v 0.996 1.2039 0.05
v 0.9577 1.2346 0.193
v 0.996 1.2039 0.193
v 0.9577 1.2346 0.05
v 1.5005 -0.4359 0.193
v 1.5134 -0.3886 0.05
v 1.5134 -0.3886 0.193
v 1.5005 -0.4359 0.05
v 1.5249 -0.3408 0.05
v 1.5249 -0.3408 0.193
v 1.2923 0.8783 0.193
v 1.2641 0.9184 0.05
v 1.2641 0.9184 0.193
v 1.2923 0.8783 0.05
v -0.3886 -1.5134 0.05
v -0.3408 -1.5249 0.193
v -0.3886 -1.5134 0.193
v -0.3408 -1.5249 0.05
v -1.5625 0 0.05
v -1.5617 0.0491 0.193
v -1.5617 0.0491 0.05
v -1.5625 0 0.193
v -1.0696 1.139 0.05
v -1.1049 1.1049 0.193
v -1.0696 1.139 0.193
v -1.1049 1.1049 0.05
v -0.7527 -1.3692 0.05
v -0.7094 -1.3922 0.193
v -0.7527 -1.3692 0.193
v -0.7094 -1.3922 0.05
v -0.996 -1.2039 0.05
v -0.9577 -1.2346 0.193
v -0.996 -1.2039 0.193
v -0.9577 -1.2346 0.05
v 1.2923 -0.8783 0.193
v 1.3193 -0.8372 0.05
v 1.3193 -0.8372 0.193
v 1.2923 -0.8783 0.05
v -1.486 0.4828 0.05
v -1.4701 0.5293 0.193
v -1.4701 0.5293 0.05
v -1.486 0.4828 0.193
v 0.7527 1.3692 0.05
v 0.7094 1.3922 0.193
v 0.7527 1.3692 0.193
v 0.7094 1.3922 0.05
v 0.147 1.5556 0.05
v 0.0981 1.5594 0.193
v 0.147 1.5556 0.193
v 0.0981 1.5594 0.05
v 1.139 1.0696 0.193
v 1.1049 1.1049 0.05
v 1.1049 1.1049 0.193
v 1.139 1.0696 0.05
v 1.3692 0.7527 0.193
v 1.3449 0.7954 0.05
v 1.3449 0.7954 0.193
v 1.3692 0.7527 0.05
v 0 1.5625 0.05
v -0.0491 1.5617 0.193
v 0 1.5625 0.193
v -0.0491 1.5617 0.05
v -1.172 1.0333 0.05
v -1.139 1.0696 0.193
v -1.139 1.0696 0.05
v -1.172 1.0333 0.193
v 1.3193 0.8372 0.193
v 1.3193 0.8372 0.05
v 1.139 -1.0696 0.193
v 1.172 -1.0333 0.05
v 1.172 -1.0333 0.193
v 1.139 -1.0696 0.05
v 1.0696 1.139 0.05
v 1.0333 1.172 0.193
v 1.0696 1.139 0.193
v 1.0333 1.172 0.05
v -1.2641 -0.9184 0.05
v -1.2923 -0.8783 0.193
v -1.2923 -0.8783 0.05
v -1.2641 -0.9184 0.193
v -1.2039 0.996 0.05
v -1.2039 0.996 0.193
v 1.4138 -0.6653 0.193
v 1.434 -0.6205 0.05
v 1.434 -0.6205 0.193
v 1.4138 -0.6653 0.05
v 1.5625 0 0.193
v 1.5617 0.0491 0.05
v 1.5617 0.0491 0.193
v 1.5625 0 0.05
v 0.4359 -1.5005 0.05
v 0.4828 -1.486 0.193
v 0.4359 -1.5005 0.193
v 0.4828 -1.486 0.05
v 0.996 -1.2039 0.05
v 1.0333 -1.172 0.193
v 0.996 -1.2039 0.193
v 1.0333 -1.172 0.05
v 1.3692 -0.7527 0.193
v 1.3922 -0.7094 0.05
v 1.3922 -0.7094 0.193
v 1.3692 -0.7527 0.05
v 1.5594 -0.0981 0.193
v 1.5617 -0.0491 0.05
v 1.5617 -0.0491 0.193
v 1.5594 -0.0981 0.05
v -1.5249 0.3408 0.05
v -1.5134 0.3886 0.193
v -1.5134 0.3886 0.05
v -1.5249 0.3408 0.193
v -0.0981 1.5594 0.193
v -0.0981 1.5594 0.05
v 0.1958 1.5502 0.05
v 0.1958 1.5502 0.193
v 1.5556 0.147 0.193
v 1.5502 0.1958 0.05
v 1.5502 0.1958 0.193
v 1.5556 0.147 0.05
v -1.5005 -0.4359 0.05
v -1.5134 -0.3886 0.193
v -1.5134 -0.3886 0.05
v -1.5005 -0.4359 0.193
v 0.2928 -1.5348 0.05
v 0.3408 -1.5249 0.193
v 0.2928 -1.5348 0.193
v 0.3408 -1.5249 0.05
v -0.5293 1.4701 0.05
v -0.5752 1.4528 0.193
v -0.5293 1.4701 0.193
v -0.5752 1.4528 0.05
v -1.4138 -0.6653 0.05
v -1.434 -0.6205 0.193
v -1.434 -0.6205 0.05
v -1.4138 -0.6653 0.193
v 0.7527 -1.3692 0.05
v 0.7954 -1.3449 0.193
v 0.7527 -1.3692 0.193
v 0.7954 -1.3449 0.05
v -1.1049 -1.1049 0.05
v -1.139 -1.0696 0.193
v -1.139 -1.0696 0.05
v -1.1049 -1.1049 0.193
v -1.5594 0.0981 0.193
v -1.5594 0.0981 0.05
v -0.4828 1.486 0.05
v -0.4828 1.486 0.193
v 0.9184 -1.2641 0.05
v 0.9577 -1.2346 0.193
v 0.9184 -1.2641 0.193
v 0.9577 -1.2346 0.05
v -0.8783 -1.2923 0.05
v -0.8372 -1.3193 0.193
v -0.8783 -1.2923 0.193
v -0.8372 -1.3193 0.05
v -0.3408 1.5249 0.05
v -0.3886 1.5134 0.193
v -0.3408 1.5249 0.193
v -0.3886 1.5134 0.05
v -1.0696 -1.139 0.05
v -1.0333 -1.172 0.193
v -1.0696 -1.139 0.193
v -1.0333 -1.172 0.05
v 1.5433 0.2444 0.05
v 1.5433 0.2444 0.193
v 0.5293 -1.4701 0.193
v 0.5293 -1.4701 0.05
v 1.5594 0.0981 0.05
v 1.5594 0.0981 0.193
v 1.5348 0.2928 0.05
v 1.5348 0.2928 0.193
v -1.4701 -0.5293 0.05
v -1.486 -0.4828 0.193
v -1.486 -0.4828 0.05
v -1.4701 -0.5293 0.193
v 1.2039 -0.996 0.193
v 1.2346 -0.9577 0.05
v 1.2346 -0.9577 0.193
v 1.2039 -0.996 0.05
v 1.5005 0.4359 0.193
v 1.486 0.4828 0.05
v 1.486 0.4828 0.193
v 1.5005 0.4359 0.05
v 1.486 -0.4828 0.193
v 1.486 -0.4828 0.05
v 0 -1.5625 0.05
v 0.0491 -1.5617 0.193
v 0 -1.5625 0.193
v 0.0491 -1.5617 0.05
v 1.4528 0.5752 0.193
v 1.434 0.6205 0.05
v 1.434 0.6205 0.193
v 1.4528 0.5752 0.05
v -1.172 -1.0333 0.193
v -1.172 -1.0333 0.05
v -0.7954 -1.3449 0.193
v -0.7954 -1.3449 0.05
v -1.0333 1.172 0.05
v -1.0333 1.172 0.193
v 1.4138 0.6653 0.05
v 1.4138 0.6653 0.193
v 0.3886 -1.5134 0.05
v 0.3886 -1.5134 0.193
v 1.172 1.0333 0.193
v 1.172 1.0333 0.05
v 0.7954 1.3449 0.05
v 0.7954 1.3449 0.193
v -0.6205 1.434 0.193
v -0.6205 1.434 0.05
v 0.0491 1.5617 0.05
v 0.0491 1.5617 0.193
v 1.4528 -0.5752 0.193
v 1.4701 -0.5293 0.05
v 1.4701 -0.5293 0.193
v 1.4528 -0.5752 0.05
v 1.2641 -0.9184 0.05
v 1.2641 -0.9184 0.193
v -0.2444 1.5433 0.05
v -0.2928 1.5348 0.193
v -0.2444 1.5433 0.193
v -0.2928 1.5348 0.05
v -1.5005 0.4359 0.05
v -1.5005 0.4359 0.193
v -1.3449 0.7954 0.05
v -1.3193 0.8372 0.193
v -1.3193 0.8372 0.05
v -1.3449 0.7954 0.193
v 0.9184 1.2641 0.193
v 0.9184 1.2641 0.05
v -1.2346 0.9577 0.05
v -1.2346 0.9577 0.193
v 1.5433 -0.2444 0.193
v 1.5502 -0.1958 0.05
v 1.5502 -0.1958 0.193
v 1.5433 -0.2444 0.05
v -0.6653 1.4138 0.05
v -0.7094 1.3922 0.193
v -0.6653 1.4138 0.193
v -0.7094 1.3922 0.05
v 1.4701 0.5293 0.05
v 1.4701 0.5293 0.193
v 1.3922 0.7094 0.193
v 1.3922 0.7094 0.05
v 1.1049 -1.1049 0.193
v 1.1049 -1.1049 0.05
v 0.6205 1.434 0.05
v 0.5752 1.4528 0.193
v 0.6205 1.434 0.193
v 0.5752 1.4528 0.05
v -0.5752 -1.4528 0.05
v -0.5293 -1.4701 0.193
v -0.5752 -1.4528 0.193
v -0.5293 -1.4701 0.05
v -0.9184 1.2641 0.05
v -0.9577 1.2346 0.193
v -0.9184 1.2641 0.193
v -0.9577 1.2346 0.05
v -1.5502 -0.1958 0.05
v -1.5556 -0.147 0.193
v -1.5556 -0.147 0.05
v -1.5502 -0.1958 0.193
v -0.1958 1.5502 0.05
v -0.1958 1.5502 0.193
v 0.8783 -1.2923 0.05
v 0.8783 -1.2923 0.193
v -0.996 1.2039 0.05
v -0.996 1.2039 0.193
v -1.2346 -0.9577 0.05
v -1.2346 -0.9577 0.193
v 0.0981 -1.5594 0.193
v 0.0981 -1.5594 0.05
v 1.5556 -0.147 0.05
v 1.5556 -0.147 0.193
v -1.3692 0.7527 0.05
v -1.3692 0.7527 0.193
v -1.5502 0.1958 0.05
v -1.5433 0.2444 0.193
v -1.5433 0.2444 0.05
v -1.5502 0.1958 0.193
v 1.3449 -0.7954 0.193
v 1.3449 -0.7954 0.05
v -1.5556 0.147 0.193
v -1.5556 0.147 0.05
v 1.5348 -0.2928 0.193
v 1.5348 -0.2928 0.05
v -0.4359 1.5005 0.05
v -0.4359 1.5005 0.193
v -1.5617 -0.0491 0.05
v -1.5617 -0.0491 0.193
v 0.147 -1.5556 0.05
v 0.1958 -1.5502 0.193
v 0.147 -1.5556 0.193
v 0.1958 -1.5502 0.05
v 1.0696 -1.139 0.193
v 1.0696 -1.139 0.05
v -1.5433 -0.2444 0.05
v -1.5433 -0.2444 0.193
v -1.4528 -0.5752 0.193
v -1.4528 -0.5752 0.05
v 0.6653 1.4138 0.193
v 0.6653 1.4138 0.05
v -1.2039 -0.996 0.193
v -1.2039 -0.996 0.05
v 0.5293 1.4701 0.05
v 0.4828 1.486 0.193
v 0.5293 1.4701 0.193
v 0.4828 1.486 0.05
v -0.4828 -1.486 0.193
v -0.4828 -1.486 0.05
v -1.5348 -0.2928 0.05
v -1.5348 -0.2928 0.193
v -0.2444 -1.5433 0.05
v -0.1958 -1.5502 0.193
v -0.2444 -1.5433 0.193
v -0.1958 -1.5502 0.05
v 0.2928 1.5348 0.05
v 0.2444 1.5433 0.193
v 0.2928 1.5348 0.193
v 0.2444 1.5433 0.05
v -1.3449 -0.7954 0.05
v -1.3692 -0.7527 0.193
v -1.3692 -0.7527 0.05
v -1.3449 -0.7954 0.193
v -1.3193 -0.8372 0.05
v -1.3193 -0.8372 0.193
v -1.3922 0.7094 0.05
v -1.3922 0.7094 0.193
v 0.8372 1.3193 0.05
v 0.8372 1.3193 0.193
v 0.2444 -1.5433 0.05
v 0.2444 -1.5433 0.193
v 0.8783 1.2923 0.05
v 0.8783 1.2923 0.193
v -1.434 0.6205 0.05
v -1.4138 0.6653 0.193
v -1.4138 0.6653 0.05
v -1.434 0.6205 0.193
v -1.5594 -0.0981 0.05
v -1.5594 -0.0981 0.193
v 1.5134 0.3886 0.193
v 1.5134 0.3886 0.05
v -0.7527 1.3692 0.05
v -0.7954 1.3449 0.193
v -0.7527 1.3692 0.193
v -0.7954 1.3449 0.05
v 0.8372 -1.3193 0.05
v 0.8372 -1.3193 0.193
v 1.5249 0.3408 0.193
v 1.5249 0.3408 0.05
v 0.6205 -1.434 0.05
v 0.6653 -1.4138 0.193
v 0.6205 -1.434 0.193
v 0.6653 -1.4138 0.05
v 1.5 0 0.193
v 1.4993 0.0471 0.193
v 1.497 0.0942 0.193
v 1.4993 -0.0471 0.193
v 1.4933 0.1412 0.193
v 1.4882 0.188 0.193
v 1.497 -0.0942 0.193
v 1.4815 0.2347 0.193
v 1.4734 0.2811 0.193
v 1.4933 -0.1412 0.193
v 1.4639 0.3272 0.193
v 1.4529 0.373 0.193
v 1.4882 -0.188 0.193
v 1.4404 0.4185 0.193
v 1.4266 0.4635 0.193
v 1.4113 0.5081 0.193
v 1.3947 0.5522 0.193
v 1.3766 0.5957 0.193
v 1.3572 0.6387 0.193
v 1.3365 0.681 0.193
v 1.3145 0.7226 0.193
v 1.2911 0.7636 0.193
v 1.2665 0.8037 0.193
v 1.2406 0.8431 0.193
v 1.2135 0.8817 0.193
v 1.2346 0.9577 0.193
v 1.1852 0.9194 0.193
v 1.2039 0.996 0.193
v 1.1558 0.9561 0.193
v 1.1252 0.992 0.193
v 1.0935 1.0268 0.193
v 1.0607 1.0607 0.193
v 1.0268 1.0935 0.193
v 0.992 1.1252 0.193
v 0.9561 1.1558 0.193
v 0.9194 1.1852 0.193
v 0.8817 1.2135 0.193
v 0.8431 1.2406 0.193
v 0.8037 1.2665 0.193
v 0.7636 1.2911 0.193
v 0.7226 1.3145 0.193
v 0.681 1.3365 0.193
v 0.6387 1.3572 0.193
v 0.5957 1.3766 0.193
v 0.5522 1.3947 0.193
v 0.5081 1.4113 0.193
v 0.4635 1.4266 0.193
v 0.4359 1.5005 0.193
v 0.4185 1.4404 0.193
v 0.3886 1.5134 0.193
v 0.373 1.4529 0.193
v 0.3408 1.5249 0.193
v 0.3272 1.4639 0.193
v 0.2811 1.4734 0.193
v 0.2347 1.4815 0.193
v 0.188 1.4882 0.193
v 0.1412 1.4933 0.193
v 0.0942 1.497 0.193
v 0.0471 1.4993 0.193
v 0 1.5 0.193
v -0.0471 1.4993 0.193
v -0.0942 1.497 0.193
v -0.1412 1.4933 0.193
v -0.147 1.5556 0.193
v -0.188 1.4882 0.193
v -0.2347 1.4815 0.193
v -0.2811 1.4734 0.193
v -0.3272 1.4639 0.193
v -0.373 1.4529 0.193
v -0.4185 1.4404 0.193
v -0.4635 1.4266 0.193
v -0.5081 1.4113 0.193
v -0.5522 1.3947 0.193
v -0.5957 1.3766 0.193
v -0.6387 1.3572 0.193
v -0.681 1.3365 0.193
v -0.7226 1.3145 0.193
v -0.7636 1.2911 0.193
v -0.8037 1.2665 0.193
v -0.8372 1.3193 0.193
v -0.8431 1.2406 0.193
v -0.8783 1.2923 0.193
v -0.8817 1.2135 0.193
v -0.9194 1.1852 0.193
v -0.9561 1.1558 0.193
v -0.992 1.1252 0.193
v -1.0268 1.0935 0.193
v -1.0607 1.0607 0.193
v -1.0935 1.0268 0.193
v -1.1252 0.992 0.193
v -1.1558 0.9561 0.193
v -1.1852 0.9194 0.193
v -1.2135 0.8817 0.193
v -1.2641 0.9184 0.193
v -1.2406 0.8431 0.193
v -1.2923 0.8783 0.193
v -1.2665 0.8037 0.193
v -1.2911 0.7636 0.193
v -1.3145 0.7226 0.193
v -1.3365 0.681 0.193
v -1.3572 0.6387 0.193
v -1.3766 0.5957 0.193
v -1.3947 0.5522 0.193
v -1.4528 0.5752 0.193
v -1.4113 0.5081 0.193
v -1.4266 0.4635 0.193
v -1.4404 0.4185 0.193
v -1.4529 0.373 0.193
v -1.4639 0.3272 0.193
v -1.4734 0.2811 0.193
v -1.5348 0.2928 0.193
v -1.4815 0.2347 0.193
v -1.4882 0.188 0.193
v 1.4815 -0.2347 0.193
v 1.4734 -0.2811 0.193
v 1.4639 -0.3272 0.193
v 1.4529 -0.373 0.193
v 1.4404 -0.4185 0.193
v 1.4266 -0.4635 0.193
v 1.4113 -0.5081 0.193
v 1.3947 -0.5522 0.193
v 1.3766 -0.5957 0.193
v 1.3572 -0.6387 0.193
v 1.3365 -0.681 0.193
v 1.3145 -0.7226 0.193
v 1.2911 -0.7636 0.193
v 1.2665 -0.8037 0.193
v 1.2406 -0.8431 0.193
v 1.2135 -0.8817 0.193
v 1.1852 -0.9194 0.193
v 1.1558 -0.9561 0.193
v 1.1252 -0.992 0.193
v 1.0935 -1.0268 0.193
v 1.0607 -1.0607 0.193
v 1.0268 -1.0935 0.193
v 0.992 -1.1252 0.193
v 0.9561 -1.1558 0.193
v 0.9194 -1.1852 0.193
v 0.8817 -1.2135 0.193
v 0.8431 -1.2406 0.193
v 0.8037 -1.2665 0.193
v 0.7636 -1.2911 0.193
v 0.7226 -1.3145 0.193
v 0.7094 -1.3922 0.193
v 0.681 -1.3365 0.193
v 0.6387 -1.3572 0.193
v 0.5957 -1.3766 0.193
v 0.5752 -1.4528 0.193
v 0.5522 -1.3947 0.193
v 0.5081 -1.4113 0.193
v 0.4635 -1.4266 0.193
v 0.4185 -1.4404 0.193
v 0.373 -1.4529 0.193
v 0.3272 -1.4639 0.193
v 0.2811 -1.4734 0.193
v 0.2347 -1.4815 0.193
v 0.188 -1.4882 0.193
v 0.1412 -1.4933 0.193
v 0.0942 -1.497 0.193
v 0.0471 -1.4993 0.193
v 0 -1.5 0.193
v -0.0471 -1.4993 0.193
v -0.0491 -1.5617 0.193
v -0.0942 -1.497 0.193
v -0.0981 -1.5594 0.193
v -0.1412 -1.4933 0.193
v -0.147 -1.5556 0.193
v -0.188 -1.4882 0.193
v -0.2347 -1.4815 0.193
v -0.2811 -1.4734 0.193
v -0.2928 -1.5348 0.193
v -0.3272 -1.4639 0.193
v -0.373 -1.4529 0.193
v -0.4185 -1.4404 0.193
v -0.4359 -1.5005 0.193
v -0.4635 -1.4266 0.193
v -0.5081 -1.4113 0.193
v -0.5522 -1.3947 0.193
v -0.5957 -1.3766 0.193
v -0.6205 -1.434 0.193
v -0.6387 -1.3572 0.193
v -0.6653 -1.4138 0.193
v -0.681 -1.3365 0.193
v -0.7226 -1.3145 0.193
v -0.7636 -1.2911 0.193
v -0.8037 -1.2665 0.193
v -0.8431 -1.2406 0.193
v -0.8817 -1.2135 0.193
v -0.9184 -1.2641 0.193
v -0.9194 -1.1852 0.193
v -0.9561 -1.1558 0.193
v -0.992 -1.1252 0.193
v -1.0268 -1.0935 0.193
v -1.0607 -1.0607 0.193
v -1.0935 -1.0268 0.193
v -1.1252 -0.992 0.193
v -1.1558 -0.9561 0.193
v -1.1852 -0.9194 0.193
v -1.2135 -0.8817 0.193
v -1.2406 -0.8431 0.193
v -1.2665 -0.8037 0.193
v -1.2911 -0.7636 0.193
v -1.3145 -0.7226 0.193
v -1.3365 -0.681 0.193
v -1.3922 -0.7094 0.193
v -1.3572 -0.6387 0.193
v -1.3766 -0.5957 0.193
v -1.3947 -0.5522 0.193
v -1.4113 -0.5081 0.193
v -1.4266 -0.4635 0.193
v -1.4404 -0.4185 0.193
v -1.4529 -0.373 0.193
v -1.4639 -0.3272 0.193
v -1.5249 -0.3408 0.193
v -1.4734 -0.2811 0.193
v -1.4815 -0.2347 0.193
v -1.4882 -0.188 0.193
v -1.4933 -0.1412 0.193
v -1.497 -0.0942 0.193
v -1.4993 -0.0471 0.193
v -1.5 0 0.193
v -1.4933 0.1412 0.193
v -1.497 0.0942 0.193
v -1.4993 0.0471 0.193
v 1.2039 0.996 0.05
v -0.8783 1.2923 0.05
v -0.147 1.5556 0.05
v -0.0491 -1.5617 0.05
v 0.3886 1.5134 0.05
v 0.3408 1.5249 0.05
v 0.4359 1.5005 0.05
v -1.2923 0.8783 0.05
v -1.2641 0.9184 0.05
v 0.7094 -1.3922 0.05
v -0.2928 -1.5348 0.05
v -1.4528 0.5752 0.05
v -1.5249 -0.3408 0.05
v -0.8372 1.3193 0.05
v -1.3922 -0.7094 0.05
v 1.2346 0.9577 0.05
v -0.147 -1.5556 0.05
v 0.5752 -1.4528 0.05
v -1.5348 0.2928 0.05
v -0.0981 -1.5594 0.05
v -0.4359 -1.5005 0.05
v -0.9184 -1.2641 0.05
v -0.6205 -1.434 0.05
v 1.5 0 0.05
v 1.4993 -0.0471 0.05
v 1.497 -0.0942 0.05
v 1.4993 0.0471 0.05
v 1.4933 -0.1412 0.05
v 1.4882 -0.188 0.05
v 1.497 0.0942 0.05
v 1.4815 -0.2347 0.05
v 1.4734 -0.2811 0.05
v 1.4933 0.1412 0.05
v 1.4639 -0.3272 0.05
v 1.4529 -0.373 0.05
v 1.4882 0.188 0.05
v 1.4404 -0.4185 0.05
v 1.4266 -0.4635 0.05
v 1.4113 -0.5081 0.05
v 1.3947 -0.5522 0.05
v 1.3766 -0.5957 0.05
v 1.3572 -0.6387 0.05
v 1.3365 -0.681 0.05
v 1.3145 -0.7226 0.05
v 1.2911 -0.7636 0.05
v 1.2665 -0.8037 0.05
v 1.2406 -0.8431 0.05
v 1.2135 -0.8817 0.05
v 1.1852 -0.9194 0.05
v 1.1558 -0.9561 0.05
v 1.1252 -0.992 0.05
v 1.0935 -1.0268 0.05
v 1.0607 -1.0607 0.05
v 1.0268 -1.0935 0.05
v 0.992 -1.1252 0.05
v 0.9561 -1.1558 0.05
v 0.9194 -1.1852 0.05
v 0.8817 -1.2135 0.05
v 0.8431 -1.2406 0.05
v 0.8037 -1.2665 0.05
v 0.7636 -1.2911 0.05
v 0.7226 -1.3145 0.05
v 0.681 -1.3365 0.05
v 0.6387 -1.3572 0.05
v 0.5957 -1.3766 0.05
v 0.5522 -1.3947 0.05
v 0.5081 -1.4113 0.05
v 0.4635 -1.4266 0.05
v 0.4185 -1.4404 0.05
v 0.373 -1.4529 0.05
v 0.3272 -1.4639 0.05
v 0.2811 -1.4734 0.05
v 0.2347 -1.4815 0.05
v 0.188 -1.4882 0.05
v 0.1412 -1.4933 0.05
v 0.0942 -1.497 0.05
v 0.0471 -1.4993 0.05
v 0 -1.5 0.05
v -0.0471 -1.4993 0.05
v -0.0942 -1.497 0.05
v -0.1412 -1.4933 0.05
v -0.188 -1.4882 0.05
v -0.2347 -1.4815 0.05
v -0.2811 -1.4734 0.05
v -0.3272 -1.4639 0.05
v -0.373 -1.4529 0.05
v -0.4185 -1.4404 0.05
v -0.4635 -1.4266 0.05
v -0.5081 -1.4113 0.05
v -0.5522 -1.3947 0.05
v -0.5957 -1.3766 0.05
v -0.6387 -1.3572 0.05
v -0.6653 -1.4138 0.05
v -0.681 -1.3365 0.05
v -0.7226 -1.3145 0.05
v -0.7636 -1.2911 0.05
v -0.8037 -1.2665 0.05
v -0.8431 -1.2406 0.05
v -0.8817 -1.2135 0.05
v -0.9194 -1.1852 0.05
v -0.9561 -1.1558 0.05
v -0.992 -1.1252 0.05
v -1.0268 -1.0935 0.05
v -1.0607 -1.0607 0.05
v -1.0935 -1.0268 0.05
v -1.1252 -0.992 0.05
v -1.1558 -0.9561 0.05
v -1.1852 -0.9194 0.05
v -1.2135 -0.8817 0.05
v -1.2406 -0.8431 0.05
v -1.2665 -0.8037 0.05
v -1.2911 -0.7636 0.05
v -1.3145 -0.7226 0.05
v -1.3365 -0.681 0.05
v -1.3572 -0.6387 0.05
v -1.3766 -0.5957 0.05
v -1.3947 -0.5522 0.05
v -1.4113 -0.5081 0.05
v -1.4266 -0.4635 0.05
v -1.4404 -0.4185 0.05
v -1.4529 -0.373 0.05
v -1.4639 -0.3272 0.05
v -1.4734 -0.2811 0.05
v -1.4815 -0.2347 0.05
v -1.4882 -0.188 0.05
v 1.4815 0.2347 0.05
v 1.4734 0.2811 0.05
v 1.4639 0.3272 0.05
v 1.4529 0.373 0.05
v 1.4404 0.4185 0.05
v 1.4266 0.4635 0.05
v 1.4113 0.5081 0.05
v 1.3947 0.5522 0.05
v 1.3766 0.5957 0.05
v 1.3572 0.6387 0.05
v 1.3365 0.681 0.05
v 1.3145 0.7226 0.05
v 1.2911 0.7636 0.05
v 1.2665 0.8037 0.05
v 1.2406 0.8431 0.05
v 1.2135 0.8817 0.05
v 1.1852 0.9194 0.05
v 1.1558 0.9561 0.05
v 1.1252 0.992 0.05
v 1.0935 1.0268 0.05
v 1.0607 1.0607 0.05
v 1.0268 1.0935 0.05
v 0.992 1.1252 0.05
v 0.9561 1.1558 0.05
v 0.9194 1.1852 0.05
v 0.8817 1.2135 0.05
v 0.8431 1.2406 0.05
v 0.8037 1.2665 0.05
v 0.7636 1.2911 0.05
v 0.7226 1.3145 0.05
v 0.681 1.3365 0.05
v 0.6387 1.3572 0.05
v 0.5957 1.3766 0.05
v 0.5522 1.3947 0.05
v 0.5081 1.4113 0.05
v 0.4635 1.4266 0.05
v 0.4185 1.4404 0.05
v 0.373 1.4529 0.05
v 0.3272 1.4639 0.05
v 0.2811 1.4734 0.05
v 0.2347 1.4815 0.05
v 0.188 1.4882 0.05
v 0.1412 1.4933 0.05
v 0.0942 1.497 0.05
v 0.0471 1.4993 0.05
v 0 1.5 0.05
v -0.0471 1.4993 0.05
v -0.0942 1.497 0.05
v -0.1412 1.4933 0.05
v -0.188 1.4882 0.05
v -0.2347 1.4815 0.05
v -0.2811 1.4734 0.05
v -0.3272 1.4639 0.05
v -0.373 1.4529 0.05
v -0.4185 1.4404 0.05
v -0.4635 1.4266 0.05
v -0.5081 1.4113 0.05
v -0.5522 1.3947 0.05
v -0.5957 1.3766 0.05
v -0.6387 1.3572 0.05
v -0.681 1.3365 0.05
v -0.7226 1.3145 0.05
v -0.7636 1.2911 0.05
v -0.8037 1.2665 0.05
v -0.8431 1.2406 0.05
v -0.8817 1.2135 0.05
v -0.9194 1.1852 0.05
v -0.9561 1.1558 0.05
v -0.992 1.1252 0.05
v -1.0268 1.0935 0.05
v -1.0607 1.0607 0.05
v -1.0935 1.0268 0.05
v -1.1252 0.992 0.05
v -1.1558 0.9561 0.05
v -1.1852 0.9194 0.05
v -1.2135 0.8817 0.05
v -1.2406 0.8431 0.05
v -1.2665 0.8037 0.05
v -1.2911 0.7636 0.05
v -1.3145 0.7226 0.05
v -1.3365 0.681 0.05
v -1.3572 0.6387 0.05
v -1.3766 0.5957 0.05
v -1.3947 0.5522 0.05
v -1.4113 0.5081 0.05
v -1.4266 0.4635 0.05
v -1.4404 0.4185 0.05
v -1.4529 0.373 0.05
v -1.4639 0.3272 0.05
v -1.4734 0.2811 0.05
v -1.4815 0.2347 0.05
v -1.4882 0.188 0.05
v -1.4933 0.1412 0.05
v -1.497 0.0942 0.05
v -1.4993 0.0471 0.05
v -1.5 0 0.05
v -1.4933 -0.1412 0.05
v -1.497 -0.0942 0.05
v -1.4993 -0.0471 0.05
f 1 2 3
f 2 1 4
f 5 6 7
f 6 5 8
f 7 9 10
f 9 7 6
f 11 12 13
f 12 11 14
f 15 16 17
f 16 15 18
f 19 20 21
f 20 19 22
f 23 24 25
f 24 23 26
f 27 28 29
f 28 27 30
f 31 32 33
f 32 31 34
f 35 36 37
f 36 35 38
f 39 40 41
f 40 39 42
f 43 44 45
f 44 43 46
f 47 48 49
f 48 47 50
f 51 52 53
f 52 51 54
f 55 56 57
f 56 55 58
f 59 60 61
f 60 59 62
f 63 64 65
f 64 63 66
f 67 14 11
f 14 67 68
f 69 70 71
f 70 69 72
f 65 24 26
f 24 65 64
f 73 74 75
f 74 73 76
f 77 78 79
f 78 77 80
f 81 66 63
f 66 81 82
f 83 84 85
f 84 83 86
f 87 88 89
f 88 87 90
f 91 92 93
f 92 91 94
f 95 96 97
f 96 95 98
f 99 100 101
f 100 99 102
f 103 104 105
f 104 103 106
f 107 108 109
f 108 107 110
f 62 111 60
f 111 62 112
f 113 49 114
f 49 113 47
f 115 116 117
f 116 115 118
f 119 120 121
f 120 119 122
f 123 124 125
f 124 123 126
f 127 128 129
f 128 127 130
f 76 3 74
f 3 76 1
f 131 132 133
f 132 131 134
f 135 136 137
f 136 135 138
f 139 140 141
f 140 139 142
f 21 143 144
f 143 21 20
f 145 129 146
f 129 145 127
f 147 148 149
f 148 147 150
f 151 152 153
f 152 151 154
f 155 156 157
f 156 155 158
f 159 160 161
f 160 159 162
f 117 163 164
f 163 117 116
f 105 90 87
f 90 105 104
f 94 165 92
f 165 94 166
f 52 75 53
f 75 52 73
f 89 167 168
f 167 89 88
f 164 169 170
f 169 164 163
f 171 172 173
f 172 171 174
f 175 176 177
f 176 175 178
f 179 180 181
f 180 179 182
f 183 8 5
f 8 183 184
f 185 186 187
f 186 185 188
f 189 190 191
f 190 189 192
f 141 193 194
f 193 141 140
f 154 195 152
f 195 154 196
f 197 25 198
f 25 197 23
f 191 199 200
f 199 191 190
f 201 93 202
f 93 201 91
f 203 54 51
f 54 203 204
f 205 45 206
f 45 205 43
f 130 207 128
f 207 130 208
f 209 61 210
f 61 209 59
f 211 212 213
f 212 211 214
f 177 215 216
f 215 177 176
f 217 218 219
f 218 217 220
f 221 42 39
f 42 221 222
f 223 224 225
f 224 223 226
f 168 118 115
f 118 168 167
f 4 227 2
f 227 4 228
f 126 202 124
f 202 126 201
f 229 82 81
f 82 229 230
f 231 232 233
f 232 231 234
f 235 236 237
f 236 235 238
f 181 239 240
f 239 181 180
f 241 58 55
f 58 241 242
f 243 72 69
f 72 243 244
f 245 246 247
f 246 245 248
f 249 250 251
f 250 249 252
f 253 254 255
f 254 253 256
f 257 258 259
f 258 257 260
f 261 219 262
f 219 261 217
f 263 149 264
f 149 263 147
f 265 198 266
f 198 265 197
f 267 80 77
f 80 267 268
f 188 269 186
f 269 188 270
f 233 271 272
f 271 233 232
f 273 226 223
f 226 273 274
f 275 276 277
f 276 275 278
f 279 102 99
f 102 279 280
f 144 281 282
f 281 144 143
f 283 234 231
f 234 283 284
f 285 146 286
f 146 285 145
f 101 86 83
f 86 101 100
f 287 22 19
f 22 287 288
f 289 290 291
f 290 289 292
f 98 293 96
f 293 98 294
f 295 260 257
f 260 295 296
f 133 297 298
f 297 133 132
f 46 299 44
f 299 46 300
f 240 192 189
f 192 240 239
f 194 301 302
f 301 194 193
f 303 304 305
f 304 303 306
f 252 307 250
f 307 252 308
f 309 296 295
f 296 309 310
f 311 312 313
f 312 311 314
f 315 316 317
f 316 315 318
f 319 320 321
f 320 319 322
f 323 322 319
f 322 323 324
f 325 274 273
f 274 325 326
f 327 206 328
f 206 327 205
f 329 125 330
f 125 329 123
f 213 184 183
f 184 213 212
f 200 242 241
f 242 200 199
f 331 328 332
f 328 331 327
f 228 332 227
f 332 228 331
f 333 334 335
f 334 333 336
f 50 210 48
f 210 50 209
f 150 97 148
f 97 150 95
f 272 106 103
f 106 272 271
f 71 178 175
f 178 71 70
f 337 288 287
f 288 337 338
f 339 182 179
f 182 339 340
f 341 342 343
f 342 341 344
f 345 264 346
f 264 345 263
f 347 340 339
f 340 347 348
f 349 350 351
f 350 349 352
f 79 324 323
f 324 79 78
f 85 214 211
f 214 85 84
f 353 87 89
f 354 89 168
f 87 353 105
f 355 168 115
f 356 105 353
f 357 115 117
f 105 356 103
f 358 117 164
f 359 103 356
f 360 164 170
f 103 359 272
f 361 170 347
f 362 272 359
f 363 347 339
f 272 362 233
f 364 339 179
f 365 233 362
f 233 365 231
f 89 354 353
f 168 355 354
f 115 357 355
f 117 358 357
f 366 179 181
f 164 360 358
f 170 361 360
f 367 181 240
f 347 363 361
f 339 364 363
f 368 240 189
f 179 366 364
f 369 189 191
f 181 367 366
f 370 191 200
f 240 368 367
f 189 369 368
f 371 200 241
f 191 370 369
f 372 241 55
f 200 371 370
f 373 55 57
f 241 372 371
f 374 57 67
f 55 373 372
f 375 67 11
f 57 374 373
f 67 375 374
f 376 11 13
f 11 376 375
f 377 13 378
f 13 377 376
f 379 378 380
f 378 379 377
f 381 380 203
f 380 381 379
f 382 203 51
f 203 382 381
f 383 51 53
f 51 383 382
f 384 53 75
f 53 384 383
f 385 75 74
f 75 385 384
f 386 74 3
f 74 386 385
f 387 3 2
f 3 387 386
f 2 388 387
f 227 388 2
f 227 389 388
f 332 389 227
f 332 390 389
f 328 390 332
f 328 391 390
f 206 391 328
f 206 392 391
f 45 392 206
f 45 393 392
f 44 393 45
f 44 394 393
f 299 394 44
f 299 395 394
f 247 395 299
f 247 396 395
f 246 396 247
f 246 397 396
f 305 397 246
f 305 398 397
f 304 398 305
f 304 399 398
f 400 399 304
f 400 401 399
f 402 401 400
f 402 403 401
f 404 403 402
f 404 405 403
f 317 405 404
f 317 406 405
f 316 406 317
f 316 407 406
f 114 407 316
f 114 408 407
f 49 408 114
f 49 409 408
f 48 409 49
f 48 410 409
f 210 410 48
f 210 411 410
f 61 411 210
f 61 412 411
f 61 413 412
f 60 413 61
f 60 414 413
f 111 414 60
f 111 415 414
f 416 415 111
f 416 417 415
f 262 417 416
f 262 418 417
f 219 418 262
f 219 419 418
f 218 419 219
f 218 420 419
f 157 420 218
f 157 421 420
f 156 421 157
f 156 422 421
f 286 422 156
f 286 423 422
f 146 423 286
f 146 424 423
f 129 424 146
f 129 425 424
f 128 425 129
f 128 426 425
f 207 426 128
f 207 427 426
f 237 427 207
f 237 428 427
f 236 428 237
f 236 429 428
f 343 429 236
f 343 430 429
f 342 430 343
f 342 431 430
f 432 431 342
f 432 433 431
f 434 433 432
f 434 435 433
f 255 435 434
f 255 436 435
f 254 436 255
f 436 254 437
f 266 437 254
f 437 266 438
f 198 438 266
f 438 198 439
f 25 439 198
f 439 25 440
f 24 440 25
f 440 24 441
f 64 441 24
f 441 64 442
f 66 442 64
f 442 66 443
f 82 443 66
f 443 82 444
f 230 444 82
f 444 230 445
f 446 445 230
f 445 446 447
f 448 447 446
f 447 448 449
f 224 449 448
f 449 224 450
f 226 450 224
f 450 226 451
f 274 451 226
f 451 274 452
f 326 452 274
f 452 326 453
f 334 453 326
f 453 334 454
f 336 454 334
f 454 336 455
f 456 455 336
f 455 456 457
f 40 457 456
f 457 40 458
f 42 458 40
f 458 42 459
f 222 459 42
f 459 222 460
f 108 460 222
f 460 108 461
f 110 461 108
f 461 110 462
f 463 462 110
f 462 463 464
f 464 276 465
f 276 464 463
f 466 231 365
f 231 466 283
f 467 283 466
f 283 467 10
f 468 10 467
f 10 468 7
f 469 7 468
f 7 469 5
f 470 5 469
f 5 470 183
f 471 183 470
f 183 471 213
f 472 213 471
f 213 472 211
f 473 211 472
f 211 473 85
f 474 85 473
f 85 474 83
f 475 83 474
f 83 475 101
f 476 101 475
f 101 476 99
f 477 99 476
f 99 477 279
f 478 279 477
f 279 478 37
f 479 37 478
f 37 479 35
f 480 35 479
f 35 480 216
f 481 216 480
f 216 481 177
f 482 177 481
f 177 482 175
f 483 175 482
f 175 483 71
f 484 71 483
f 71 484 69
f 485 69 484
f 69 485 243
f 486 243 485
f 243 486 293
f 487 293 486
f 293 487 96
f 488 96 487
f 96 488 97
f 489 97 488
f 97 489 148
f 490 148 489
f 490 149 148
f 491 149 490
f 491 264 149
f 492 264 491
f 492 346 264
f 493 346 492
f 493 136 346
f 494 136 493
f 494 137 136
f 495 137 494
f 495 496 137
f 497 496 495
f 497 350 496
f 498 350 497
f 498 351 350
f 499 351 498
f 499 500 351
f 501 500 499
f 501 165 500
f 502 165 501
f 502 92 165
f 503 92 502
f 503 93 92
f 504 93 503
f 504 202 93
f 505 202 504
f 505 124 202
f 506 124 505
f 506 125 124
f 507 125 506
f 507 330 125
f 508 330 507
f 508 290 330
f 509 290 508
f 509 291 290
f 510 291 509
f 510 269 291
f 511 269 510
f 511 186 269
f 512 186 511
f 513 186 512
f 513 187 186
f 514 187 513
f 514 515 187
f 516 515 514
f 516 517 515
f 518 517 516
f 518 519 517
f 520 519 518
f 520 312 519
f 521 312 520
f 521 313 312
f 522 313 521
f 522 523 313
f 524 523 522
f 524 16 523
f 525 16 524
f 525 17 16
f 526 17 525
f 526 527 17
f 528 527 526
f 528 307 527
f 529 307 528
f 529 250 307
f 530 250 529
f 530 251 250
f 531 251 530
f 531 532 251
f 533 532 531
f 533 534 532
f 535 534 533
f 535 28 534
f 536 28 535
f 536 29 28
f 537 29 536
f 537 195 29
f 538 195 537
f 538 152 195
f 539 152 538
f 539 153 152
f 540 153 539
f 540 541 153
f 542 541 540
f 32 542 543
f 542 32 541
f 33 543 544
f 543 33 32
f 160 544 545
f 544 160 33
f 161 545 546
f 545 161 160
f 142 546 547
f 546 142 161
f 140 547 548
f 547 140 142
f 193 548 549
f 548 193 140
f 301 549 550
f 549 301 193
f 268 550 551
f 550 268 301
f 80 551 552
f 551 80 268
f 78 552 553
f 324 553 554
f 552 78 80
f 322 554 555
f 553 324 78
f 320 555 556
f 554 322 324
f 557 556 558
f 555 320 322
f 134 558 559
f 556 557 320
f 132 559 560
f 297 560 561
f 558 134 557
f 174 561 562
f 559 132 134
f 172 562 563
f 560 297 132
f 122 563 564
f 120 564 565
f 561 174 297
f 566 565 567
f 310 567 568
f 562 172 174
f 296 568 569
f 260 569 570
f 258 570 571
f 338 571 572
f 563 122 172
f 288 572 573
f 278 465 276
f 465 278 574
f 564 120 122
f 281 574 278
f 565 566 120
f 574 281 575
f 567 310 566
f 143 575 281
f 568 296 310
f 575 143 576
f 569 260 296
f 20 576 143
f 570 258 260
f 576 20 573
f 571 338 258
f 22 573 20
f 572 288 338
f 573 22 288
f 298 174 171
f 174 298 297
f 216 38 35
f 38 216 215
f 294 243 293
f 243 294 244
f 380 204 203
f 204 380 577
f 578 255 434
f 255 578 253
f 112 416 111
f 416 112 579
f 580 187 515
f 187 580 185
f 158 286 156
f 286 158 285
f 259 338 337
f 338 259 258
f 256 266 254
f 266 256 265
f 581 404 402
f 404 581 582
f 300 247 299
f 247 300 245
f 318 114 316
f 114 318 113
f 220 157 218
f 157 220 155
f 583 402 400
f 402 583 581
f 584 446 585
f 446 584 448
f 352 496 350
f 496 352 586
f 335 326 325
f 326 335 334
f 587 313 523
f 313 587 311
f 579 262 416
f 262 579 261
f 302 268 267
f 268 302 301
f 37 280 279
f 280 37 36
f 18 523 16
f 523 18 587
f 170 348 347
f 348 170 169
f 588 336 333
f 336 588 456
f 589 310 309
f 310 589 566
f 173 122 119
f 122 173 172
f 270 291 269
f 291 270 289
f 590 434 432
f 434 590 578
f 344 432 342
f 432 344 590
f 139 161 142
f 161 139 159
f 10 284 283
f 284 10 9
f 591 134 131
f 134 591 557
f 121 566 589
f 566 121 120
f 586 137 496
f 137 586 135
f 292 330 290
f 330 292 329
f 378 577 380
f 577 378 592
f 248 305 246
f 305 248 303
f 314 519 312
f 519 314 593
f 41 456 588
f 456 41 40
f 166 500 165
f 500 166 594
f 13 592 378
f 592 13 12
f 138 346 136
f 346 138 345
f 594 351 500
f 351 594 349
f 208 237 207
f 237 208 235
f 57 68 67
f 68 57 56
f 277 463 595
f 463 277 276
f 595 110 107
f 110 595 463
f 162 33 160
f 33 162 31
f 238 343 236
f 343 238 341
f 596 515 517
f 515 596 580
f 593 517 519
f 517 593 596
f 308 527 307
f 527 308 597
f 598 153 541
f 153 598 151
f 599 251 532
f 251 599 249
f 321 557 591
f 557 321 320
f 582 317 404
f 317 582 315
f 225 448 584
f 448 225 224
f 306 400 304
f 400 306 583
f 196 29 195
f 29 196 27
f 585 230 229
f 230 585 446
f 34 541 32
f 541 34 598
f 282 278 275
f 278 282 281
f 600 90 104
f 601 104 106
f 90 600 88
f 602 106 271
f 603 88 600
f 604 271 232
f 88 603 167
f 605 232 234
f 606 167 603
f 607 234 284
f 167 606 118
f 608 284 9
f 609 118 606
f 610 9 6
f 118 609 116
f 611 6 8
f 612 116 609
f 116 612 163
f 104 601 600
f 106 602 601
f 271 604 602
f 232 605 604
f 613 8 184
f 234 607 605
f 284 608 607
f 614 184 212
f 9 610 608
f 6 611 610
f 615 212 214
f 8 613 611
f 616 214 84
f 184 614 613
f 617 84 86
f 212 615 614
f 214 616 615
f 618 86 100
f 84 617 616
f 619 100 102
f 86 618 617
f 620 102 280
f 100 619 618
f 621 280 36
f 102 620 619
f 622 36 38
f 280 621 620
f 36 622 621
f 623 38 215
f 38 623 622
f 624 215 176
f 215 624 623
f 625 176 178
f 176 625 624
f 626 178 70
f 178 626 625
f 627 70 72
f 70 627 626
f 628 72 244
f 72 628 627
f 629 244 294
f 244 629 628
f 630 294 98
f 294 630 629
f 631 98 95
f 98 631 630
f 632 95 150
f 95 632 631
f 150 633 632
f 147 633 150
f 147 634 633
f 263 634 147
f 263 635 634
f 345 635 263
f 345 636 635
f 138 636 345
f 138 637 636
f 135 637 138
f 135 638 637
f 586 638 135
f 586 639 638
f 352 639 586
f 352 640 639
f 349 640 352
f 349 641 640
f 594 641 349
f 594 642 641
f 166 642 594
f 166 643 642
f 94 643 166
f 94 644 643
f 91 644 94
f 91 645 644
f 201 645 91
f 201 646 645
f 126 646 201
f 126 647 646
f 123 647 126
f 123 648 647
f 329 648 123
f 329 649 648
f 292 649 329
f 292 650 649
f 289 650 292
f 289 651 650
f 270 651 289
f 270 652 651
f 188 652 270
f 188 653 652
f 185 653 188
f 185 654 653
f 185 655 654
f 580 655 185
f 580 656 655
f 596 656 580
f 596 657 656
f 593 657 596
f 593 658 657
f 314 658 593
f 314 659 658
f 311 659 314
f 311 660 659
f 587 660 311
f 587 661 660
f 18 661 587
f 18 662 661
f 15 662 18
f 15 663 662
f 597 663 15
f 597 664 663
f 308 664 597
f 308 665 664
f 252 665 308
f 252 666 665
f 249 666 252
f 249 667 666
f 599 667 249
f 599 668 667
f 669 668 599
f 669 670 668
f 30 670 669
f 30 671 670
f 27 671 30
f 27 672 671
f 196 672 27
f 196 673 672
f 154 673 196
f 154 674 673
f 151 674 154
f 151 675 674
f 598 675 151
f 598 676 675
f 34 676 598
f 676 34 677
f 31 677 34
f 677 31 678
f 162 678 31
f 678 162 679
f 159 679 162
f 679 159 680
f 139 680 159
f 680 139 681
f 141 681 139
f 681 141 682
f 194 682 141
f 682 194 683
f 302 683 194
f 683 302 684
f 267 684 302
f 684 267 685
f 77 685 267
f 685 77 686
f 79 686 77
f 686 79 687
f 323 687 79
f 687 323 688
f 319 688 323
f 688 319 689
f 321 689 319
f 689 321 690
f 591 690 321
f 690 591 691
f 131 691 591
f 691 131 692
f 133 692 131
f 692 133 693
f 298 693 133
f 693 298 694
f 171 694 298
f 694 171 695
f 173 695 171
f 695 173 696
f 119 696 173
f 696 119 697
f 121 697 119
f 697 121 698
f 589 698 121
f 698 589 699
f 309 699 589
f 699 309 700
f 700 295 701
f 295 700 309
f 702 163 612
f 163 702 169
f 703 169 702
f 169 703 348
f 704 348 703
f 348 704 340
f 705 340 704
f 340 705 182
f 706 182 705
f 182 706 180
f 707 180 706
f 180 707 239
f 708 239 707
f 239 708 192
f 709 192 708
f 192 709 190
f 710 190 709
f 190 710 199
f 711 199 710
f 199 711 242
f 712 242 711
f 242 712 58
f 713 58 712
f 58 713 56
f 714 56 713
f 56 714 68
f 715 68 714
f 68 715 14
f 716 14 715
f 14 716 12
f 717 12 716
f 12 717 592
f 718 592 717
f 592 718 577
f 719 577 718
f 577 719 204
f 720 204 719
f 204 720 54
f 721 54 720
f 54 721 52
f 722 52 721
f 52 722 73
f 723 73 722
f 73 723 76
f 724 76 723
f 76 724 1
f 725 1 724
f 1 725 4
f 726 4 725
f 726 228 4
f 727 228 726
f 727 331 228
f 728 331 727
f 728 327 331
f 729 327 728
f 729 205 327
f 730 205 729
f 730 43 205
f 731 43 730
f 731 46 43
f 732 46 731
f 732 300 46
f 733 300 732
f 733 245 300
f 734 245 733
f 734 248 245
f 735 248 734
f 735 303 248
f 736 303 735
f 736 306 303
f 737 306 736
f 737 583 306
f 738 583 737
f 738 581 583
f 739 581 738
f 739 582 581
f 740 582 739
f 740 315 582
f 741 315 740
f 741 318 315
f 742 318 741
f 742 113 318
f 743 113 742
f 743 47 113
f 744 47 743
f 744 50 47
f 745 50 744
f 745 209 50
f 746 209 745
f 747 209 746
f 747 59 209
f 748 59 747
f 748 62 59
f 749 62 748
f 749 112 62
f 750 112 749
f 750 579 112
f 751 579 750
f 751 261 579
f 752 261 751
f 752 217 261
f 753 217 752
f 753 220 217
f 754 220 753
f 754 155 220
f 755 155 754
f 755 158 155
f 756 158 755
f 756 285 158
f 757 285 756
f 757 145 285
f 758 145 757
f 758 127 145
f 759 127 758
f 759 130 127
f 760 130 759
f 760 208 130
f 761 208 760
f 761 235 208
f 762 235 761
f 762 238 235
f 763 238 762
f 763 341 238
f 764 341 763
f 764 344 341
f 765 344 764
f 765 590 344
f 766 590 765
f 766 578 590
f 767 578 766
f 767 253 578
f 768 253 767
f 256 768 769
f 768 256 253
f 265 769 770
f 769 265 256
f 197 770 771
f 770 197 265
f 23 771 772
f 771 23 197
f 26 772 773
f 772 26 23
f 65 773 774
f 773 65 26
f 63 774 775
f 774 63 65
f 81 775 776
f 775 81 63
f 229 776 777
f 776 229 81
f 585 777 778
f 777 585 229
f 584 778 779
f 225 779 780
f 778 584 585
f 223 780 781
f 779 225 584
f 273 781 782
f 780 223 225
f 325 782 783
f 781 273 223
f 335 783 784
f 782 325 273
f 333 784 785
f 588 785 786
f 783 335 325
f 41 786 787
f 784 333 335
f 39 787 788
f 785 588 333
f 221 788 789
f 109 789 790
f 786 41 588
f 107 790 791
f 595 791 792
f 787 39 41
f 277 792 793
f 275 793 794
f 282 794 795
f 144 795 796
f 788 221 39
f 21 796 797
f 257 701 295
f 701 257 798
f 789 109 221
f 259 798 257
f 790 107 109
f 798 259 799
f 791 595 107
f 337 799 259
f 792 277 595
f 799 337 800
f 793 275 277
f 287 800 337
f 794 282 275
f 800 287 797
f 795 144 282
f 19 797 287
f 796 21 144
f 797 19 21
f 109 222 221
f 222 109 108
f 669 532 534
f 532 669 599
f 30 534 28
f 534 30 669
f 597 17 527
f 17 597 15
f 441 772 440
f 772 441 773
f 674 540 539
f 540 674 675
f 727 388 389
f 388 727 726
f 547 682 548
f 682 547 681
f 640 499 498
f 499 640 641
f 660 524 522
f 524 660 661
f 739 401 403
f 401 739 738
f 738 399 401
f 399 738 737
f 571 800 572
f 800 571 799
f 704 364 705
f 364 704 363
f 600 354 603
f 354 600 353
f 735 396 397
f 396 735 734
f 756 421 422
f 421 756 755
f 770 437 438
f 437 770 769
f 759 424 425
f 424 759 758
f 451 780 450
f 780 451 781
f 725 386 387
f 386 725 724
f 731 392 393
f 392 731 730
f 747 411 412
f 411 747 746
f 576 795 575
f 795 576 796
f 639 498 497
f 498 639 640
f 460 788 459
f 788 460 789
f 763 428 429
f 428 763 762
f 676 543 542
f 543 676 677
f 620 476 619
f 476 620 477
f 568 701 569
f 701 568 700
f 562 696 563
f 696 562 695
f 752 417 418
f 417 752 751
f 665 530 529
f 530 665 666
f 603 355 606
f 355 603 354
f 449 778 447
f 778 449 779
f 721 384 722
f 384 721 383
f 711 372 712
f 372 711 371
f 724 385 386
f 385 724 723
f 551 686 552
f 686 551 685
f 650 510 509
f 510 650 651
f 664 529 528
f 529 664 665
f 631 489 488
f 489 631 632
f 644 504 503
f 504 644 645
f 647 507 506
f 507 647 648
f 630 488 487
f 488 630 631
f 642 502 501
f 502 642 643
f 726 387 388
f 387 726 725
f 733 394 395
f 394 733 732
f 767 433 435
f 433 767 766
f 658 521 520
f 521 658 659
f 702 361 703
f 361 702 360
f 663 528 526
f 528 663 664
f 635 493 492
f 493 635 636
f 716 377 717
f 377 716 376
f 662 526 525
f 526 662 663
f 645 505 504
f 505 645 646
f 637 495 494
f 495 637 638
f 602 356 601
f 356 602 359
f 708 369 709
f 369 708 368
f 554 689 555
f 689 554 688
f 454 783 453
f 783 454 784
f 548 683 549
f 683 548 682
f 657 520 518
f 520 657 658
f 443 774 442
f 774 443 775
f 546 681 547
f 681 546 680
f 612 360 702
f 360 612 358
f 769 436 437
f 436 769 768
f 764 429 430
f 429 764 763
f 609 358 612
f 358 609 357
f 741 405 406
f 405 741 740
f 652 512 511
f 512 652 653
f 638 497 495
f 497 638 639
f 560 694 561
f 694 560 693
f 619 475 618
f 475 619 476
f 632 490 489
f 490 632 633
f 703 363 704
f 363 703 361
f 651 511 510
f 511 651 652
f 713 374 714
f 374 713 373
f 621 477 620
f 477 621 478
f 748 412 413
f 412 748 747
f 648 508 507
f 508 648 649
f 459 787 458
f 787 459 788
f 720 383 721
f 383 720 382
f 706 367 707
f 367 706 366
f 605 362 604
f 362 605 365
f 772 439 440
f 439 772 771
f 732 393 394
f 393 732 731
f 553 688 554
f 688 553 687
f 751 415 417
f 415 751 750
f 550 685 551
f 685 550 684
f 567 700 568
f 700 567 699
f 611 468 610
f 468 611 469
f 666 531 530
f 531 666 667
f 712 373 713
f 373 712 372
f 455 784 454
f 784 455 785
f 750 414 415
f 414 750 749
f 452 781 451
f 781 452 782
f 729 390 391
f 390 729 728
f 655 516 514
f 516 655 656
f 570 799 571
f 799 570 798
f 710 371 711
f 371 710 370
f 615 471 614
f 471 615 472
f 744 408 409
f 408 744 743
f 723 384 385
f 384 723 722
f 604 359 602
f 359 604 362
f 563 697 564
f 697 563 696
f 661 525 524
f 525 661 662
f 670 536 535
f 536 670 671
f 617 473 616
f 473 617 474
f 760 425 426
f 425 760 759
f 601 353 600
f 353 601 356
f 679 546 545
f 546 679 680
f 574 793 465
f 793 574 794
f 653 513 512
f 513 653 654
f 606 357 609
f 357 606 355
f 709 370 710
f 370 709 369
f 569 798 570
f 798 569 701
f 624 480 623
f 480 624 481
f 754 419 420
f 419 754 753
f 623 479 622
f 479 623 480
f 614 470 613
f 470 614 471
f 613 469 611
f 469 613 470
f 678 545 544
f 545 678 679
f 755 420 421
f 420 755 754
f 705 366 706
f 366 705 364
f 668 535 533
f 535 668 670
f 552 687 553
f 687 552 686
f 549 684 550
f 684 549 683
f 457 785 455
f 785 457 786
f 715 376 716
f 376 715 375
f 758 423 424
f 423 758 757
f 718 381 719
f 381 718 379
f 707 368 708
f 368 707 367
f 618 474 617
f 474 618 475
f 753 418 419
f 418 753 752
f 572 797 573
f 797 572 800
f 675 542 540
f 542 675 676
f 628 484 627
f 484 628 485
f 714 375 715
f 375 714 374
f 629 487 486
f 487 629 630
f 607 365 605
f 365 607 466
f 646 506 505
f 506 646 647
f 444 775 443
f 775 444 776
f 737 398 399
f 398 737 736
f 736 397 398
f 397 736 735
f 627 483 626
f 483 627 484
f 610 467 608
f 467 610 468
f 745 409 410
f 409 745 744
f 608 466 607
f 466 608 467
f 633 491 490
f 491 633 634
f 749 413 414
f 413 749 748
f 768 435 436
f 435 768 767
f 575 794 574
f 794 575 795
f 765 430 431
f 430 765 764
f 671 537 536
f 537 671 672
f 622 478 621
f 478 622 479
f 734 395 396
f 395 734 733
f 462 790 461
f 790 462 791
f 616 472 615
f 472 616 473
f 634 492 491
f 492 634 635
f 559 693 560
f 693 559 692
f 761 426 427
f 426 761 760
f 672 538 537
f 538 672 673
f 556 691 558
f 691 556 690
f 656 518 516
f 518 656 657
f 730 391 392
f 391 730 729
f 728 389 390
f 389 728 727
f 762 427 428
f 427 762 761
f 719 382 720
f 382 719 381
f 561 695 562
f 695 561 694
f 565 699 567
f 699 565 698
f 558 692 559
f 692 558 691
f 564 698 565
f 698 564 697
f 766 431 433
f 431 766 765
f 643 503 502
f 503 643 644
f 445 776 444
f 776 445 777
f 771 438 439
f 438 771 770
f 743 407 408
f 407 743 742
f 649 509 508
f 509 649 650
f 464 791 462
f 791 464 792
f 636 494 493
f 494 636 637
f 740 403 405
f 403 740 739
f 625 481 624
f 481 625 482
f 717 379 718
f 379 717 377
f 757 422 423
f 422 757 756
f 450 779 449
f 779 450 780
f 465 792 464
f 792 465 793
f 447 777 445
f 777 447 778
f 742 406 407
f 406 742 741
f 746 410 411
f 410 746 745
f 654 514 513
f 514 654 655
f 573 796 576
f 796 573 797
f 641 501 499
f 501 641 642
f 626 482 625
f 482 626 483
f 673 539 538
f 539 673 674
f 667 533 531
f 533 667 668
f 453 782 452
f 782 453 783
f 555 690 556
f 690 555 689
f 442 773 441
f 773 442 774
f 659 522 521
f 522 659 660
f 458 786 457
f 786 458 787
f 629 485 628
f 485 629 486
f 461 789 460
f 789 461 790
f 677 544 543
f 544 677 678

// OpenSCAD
module FlatHead(x, y, z)
{
  translate([x,y,z-0.075])
    union() {
      translate([0, 0, 0.085])
        cylinder(h = 0.200, d = 0.225, center = false, $fn = 100);
      cylinder(h = 0.085, d1 = 0.125, d2 = 0.225, center = false, $fn = 100);
      translate([0, 0, -0.200])
        cylinder(h = 0.300, d = 0.125, center = false, $fn = 100);
  }
}

module HexNut440(x, y, rot)
{
  rotate(a = rot, v = [0, 0, 1])
    translate([x,y,0 - 0.010])
      union() {
        rotate([0, 0, 30])
          cylinder(h = 0.075 + 0.010, d = 0.200, center = false, $fn = 6);
        cylinder(h = 0.500, d = 0.125, center = true, $fn = 100);
      }
}

union() {
  difference() {
    linear_extrude(height = 0.1, center = false, convexity = 10, slices = 10)
       import(file = "FlangeAOutline2.dxf");

    /* cut center hole */
    cylinder (h = 0.5, d=2.35, center=true, $fn = 250);

    /* cut mounting holes */
    translate([1.25, 1.25, 0])
       cylinder(h = 0.5, d = 0.188, center = true, $fn = 40);
    translate([-1.25, 1.25, 0])
       cylinder(h = 0.5, d = 0.188, center = true, $fn = 40);
    translate([1.25, -1.25, 0])
       cylinder(h = 0.5, d = 0.188, center = true, $fn = 40);
    translate([-1.25, -1.25, 0])
       cylinder(h = 0.5, d = 0.188, center = true, $fn = 40);

    /* access for assembly screws */
    FlatHead(1, 2.75/2, 0.100);
    FlatHead(-1, 2.75/2, 0.100);
    FlatHead(1, -2.75/2, 0.100);
    FlatHead(-1, -2.75/2, 0.100);
    FlatHead(2.75/2, 1, 0.100);
    FlatHead(-2.75/2, 1, 0.100);
    FlatHead(2.75/2, -1, 0.100);
    FlatHead(-2.75/2, -1, 0.100);

    /* Front gear deck mounting holes and nuts */
    HexNut440(2.627 / 2, 0, 0);
    HexNut440(2.627 / 2, 0, 45);
    HexNut440(2.627 / 2, 0, 90);
    HexNut440(2.627 / 2, 0, 135);
    HexNut440(2.627 / 2, 0, 180);
    HexNut440(2.627 / 2, 0, 225);
    HexNut440(2.627 / 2, 0, 270);
    HexNut440(2.627 / 2, 0, 315);

  }

  /* rim for front gear deck */
  translate([0, 0, 0.05])
    difference() {
      cylinder (h = 0.193 - 0.05, d=3.125, center = false, $fn = 200);
      cylinder (h = 0.5, d=3.000, center = true, $fn = 200);
  }

}
